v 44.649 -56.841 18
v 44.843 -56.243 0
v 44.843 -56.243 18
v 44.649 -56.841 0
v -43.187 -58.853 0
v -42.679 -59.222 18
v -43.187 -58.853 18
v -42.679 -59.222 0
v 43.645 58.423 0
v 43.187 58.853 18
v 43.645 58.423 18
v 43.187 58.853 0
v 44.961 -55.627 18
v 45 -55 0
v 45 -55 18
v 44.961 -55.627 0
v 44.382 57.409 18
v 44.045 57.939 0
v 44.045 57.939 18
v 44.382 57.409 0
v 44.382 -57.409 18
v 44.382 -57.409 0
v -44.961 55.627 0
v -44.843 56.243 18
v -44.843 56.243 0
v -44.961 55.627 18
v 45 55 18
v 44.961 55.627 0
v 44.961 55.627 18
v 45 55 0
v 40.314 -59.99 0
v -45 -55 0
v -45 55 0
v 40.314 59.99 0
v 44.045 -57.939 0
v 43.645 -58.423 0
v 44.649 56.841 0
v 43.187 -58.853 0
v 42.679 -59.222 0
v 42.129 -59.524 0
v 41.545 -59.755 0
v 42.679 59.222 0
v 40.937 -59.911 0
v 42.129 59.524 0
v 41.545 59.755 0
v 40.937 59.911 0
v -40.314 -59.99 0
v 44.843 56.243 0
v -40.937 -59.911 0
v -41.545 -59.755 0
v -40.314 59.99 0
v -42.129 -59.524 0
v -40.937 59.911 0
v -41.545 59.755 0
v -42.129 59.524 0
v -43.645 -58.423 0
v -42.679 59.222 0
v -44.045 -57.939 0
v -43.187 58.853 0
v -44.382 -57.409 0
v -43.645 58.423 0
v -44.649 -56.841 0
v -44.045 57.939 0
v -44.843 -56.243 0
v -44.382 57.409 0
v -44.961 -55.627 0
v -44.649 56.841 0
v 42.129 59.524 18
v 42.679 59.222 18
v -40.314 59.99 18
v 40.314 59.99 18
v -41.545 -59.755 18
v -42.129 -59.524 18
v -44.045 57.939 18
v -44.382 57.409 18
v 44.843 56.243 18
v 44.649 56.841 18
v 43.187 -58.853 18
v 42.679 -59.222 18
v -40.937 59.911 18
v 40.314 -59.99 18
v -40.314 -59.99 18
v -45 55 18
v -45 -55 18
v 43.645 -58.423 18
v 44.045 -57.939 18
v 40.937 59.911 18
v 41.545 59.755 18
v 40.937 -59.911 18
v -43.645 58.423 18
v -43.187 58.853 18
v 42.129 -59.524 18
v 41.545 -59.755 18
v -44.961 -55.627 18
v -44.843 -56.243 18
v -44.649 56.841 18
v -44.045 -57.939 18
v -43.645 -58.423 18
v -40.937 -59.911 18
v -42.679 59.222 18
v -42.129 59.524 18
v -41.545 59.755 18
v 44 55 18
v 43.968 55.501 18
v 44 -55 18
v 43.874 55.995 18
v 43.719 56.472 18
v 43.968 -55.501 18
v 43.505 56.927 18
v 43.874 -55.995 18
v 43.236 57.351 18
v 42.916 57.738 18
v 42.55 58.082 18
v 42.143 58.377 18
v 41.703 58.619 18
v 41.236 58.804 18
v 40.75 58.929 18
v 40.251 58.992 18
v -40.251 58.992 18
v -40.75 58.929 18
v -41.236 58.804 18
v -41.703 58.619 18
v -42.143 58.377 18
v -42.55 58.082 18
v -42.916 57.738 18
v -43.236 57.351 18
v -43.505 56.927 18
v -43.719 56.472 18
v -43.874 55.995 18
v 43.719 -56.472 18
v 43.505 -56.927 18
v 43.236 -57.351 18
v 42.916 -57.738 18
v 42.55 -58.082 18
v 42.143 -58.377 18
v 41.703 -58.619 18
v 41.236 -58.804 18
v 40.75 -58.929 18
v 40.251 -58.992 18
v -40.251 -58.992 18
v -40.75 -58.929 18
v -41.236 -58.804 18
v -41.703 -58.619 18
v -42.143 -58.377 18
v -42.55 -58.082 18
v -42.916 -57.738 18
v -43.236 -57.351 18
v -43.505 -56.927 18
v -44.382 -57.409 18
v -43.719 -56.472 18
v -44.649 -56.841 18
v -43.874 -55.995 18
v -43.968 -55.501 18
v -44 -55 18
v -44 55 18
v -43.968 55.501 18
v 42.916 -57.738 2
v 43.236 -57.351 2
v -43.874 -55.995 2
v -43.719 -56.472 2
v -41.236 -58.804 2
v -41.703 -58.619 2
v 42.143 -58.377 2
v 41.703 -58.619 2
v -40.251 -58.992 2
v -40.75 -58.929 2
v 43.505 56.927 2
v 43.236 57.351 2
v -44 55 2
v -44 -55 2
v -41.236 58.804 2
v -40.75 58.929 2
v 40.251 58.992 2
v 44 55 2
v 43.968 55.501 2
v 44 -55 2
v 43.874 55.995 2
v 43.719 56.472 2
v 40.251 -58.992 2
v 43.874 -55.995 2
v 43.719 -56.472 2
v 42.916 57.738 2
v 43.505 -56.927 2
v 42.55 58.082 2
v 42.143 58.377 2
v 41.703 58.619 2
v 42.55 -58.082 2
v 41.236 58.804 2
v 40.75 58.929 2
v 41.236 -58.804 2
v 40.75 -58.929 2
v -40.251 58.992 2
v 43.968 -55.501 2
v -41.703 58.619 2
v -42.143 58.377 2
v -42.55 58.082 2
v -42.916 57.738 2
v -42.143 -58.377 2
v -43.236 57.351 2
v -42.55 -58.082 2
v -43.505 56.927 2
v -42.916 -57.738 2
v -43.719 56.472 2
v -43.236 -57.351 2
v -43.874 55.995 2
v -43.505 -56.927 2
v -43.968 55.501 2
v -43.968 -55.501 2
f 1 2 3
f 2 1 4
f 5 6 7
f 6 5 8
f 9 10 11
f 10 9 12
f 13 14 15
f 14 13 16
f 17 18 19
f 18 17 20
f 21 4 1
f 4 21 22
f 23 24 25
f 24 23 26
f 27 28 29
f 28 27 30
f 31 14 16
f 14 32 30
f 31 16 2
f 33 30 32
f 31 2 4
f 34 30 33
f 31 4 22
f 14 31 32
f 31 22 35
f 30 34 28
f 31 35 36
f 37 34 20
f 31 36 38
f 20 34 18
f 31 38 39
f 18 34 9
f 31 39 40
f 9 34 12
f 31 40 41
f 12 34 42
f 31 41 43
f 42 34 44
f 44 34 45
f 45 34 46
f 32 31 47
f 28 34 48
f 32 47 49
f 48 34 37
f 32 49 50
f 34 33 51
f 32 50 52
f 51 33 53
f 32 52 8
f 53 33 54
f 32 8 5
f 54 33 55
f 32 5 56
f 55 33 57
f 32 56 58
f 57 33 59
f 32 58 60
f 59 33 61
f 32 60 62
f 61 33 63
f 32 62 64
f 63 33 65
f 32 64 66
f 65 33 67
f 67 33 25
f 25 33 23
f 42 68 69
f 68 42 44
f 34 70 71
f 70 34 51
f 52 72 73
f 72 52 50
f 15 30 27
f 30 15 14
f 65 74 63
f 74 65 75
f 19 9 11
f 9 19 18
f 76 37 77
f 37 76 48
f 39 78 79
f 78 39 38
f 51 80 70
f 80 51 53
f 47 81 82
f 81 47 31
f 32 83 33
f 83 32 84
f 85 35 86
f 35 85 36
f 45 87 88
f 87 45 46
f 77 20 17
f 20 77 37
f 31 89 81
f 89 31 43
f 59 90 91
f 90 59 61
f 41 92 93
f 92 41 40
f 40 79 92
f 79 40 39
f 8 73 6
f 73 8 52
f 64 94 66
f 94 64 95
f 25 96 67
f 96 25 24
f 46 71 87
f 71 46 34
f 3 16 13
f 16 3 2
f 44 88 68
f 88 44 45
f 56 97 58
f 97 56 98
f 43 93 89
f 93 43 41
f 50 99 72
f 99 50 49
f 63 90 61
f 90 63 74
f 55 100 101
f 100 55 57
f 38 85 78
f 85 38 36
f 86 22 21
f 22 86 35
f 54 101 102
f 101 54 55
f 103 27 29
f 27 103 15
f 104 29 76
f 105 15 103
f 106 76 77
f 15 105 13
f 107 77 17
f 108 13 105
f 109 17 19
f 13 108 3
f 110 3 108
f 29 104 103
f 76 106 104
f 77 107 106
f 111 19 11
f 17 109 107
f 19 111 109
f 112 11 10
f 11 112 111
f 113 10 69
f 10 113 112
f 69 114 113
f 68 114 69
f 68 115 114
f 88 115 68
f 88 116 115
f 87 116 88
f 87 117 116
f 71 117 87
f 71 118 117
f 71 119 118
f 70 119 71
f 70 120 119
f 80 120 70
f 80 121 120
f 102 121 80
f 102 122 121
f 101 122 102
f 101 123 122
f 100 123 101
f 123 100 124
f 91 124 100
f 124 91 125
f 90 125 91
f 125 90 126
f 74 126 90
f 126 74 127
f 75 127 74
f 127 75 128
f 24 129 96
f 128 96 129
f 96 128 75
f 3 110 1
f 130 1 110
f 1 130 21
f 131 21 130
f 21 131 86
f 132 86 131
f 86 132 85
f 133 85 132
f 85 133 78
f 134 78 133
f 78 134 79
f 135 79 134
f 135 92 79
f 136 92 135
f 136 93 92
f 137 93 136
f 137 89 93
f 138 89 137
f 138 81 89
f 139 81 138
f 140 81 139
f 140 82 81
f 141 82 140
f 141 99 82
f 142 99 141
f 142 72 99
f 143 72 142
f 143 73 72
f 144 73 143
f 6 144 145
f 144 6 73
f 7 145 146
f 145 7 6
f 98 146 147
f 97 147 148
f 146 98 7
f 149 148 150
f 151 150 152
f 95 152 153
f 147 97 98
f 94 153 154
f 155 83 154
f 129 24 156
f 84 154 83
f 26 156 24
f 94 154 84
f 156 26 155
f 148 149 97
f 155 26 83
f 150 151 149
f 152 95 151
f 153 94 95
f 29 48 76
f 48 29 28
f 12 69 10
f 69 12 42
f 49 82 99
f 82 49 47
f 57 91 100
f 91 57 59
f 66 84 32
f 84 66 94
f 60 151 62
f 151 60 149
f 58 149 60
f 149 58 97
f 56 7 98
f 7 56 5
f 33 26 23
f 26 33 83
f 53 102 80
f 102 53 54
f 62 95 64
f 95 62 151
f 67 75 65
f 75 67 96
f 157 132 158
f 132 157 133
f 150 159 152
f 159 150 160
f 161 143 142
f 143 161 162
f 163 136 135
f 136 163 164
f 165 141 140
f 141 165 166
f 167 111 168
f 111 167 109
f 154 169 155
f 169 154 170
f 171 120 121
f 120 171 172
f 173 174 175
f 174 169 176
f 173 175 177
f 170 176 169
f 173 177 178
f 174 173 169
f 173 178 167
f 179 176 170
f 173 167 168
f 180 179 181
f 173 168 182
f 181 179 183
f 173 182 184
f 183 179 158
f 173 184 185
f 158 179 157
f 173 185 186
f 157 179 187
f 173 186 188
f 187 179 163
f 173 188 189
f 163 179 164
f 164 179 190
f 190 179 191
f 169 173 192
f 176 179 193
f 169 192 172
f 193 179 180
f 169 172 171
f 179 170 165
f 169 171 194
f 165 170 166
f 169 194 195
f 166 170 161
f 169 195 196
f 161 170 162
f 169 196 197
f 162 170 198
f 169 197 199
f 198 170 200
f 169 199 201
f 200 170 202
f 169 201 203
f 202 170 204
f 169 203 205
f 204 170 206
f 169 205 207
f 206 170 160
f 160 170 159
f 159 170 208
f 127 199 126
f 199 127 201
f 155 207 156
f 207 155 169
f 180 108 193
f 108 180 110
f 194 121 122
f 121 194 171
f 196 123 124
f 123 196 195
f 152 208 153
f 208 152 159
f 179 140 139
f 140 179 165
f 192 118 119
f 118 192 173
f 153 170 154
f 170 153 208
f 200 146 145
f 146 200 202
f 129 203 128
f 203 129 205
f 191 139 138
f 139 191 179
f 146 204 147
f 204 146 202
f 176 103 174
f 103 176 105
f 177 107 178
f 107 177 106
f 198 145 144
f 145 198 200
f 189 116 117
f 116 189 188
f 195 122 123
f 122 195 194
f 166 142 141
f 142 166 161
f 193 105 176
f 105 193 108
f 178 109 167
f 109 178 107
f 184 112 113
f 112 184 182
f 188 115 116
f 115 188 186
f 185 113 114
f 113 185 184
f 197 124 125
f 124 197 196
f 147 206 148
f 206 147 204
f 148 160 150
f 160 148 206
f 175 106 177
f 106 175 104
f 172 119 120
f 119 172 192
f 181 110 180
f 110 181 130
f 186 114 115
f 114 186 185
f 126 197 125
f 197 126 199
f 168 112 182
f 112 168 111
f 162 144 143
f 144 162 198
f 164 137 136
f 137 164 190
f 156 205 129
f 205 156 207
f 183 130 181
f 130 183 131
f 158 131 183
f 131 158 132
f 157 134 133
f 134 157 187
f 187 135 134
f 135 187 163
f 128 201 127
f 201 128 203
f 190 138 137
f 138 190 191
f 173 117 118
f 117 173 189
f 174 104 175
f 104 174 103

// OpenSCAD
$fn = 50;


difference() {
	union() {
		hull() {
			translate(v = [-40.0000000000, 55.0000000000, 0]) {
				cylinder(h = 18, r = 5);
			}
			translate(v = [40.0000000000, 55.0000000000, 0]) {
				cylinder(h = 18, r = 5);
			}
			translate(v = [-40.0000000000, -55.0000000000, 0]) {
				cylinder(h = 18, r = 5);
			}
			translate(v = [40.0000000000, -55.0000000000, 0]) {
				cylinder(h = 18, r = 5);
			}
		}
	}
	union() {
		translate(v = [0, 0, 2]) {
			hull() {
				translate(v = [-40.0000000000, 55.0000000000, 0]) {
					cylinder(h = 16, r = 4);
				}
				translate(v = [40.0000000000, 55.0000000000, 0]) {
					cylinder(h = 16, r = 4);
				}
				translate(v = [-40.0000000000, -55.0000000000, 0]) {
					cylinder(h = 16, r = 4);
				}
				translate(v = [40.0000000000, -55.0000000000, 0]) {
					cylinder(h = 16, r = 4);
				}
			}
		}
	}
}
